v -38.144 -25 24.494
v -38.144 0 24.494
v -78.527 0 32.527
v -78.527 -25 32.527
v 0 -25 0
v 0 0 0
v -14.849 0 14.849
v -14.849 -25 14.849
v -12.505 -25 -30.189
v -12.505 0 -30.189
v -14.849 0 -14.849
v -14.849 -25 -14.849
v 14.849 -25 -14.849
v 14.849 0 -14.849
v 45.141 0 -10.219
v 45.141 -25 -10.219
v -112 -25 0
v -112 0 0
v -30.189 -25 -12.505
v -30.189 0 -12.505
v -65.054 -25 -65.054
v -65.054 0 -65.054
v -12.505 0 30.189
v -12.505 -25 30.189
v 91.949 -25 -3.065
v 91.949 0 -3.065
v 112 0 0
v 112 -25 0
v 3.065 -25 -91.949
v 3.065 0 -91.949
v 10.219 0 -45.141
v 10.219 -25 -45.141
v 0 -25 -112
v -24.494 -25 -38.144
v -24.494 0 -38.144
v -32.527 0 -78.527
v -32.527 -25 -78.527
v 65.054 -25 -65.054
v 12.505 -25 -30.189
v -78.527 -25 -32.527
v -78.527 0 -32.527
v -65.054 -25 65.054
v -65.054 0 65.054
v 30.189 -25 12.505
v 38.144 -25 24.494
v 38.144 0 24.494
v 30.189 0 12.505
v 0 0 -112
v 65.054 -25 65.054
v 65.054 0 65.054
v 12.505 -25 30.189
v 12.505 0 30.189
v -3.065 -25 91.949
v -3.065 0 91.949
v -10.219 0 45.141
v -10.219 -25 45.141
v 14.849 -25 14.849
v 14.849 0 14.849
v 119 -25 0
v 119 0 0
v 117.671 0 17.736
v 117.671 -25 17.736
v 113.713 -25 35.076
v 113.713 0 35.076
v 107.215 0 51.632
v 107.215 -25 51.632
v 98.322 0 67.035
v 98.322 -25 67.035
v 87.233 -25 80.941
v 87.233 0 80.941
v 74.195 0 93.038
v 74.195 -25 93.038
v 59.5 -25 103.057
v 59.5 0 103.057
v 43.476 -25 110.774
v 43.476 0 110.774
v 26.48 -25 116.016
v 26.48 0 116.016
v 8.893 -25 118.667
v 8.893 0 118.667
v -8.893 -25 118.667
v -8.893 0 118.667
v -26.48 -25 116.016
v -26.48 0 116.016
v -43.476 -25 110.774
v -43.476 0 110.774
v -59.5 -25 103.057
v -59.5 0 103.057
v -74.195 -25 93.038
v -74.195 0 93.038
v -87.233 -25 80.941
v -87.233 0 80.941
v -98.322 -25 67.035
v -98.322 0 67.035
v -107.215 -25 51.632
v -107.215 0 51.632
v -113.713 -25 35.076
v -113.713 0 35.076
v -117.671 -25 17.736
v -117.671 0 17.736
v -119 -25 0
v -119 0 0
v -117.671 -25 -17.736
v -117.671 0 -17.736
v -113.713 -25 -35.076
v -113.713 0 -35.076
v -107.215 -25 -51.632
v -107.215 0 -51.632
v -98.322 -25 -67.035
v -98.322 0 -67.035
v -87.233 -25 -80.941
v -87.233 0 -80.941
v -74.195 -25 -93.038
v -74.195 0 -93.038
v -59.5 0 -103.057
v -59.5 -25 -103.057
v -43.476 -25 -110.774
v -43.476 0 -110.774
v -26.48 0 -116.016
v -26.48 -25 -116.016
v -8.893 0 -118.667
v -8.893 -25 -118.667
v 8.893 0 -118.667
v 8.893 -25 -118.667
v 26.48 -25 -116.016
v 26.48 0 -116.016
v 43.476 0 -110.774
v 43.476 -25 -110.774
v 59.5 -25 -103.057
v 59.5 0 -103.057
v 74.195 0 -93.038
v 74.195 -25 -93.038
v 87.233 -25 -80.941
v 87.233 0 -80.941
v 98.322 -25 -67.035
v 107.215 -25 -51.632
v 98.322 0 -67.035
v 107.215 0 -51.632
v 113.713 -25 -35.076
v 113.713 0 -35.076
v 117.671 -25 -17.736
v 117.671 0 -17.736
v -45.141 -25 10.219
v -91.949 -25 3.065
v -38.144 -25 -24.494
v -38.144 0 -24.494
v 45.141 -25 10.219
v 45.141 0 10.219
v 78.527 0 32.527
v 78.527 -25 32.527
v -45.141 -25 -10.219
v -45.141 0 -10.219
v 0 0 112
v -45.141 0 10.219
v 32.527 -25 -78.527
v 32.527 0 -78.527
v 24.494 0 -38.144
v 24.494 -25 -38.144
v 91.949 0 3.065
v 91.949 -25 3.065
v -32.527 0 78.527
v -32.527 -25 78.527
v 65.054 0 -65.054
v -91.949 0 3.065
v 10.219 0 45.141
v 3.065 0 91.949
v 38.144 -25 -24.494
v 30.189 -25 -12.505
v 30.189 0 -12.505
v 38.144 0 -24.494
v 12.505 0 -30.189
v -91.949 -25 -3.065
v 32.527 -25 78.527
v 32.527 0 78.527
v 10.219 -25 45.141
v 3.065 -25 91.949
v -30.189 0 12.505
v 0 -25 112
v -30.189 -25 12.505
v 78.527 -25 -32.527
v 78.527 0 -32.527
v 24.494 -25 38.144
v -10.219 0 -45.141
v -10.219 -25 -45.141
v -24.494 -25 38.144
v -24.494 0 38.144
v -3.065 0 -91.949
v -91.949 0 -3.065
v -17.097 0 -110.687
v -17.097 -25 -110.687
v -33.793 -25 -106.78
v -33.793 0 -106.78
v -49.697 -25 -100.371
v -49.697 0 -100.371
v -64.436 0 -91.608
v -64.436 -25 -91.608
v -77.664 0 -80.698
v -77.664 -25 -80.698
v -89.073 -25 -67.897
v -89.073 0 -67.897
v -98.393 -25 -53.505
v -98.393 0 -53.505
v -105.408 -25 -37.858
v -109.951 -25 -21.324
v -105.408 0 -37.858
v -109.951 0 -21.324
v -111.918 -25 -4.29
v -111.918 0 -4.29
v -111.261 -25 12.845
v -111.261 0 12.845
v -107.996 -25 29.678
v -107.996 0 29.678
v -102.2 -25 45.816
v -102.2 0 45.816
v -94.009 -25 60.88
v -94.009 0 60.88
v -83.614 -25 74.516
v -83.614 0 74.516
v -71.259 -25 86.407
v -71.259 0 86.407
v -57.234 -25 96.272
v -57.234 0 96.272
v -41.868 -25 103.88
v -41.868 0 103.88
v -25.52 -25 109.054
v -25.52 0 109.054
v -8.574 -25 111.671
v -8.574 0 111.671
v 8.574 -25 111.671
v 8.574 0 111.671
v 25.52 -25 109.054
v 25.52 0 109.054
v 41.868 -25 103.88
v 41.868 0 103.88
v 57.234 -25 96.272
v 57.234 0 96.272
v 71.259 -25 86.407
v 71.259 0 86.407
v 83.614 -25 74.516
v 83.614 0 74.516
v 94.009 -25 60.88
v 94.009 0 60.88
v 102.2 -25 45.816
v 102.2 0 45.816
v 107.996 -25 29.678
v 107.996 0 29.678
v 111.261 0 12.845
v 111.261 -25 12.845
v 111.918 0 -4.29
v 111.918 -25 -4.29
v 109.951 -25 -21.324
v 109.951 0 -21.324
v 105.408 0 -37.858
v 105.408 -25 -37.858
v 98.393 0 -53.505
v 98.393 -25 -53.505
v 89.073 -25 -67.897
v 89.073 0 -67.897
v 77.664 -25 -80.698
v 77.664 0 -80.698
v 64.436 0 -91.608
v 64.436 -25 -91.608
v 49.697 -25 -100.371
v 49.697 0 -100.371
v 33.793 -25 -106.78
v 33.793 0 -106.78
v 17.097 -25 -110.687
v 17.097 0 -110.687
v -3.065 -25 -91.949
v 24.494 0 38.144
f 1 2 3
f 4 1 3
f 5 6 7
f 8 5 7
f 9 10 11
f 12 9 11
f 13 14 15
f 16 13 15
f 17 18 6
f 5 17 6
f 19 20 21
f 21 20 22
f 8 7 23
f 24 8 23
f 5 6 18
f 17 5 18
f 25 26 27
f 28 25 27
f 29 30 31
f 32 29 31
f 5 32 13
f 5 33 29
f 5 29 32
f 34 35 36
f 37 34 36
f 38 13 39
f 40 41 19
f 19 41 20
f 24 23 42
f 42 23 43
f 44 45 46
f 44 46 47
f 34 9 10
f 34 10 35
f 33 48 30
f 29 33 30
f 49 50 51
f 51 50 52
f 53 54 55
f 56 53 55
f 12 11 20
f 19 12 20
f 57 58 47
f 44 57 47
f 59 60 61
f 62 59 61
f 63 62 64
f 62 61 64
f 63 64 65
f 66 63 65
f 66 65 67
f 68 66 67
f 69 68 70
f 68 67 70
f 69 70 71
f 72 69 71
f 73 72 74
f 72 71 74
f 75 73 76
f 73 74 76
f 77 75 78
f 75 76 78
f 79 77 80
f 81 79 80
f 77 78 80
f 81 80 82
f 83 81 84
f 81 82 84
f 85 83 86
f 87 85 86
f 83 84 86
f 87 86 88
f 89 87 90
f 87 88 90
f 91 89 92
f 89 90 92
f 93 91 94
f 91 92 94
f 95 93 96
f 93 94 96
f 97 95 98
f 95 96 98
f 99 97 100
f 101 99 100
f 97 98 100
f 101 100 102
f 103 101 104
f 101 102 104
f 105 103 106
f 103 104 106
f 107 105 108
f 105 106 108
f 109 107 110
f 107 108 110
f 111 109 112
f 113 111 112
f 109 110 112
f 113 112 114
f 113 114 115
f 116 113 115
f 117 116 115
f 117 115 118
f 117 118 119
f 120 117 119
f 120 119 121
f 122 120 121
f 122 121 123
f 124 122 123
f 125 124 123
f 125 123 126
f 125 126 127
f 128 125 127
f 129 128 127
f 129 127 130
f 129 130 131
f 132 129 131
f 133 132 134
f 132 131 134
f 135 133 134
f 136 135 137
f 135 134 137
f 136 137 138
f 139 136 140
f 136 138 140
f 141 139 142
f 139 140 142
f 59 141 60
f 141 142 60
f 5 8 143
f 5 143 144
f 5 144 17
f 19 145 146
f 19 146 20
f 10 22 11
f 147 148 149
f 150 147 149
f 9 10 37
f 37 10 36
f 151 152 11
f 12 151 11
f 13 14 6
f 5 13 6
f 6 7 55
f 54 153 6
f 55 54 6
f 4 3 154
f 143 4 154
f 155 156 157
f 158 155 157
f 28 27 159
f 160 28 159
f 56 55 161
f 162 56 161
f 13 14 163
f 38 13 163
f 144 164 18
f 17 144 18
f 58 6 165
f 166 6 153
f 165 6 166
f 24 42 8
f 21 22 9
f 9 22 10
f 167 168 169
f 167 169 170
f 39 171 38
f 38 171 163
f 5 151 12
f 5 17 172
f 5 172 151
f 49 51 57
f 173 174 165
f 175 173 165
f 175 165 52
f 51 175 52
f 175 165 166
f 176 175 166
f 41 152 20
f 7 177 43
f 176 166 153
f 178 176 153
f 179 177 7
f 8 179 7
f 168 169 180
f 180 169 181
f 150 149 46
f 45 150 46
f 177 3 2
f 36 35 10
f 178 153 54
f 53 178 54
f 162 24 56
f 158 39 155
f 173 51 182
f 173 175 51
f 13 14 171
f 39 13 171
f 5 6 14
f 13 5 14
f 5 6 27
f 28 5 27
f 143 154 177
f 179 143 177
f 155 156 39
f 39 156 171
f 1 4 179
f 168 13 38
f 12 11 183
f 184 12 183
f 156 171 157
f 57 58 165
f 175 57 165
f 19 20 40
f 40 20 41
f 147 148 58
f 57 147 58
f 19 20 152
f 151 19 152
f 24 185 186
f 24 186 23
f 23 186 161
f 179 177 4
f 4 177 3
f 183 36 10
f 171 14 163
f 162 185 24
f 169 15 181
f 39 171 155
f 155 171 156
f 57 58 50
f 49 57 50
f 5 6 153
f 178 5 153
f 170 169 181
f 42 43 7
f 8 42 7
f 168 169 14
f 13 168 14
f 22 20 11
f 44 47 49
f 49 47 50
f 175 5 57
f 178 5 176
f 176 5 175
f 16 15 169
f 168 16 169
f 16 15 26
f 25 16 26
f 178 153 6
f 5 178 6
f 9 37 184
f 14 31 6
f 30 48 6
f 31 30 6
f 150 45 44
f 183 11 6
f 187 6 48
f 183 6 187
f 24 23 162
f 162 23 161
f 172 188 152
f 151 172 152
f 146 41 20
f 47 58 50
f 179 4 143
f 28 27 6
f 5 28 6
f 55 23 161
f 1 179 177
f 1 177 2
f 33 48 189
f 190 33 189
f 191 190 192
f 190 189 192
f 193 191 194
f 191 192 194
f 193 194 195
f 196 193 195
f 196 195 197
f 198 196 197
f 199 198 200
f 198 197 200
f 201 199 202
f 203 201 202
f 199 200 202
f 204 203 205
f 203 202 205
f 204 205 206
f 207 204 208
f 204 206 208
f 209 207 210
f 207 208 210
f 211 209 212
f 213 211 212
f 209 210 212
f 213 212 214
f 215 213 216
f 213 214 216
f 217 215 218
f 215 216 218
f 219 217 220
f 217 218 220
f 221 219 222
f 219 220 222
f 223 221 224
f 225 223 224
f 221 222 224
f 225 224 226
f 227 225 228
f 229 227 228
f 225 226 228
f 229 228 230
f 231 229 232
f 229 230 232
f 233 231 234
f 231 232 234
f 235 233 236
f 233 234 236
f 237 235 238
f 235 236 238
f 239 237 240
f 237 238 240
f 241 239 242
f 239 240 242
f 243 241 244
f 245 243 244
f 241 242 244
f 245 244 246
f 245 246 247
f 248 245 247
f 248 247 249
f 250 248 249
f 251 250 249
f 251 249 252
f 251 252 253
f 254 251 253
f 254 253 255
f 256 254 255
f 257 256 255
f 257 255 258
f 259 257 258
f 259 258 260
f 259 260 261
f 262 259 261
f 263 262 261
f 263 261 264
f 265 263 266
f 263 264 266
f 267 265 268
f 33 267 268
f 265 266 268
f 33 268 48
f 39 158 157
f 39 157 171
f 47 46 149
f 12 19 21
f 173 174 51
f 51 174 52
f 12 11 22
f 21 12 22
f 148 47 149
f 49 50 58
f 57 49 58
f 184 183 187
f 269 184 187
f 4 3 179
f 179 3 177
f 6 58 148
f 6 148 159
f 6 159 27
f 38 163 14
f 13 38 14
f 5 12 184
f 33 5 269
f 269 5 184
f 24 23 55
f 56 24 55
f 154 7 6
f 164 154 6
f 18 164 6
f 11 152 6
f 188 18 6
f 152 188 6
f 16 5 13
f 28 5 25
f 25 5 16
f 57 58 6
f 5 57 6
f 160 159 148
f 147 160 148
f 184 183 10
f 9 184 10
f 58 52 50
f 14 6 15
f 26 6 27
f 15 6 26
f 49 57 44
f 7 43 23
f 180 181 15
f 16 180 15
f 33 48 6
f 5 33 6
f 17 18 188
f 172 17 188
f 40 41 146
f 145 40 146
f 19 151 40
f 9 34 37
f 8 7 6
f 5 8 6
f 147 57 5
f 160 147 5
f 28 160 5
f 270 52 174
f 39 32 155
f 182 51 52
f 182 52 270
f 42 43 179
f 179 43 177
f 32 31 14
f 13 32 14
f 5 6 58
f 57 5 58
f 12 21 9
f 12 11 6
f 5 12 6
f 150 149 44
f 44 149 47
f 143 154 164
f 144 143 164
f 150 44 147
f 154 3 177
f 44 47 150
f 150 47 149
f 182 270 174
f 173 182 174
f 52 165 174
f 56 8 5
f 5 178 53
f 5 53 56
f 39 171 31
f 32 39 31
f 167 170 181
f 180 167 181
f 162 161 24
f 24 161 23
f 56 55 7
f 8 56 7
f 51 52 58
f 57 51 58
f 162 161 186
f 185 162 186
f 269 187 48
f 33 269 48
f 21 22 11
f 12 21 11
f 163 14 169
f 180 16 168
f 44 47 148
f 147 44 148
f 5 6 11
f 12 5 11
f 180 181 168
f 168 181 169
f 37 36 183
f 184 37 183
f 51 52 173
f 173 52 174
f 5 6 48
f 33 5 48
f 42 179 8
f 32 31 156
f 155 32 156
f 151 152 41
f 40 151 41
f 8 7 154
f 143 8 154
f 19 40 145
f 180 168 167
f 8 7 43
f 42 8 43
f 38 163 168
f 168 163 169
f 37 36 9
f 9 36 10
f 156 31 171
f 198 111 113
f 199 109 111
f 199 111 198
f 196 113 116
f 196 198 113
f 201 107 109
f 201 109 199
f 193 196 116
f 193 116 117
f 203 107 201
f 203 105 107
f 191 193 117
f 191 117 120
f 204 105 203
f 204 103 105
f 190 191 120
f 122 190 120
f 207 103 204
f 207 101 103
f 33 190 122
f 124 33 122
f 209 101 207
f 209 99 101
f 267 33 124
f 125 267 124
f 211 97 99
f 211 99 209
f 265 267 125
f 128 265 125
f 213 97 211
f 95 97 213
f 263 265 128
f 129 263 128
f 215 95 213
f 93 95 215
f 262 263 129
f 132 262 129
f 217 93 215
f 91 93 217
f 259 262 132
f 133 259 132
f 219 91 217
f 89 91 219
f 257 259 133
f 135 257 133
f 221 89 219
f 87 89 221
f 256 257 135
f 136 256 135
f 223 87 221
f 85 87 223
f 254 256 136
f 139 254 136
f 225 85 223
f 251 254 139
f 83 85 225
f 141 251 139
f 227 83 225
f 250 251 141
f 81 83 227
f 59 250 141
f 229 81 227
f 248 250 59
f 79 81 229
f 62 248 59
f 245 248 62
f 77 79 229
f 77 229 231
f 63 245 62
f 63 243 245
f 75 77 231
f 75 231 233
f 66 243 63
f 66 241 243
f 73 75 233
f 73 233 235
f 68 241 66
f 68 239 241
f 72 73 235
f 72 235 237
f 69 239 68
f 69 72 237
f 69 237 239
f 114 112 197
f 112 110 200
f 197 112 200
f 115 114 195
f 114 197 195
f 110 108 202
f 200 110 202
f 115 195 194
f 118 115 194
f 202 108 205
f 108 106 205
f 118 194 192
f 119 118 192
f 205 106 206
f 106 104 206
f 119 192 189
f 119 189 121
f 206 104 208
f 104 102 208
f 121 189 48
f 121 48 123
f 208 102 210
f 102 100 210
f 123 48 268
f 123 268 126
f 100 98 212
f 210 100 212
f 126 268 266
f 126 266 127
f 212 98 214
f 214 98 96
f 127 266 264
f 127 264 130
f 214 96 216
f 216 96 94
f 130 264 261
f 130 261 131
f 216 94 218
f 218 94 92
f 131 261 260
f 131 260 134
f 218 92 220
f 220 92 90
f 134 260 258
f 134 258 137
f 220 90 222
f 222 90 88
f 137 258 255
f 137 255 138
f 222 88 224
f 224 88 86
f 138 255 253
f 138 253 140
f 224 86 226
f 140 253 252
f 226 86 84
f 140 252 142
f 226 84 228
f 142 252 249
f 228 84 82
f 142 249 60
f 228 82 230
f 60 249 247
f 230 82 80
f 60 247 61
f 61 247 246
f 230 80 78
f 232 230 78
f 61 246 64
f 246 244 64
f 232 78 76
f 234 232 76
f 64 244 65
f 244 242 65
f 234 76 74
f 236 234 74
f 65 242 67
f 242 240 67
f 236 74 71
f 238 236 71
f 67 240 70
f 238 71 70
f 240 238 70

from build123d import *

# Parameters (mm, degrees)
F1_DEPTH = 25
F0_R     = 119
F2_DEPTH = 25


with BuildPart() as f1:
    # F0 (on Front) → F1 (new body)
    with BuildSketch(Plane.XZ):
        Polygon((0, -112), (0, 0), (-14.8492424049, -14.8492424049), (-12.5046251831, -30.1888357094), (-10.2192130658, -45.1410812557), (-3.0647529698, -91.9489384889), align=None)
    extrude(amount=F1_DEPTH)


with BuildPart() as f1b:
    # F0 (on Front) → F1, piece 2 (new body)
    with BuildSketch(Plane.XZ):
        Polygon((-112, 0), (0, 0), (-14.8492424049, 14.8492424049), (-30.1888357094, 12.5046251831), (-45.1410812557, 10.2192130658), (-91.9489384889, 3.0647529698), align=None)
    extrude(amount=F1_DEPTH)


with BuildPart() as f1c:
    # F0 (on Front) → F1, piece 3 (new body)
    with BuildSketch(Plane.XZ):
        Polygon((0, 112), (0, 0), (14.8492424049, 14.8492424049), (12.5046251831, 30.1888357094), (10.2192130658, 45.1410812557), (3.0647529698, 91.9489384889), align=None)
    extrude(amount=F1_DEPTH)


with BuildPart() as f1d:
    # F0 (on Front) → F1, piece 4 (new body)
    with BuildSketch(Plane.XZ):
        Polygon((112, 0), (0, 0), (14.8492424049, -14.8492424049), (30.1888357094, -12.5046251831), (45.1410812557, -10.2192130658), (91.9489384889, -3.0647529698), align=None)
    extrude(amount=F1_DEPTH)


with BuildPart() as f1e:
    # F0 (on Front) → F1, piece 5 (new body)
    with BuildSketch(Plane.XZ):
        Polygon((65.0538238692, -65.0538238692), (14.8492424049, -14.8492424049), (12.5046251831, -30.1888357094), (24.4941670021, -38.1435761053), align=None)
    extrude(amount=F1_DEPTH)


with BuildPart() as f1f:
    # F0 (on Front) → F1, piece 6 (new body)
    with BuildSketch(Plane.XZ):
        Polygon((-65.0538238692, -65.0538238692), (-14.8492424049, -14.8492424049), (-30.1888357094, -12.5046251831), (-38.1435761053, -24.4941670021), align=None)
    extrude(amount=F1_DEPTH)


with BuildPart() as f1g:
    # F0 (on Front) → F1, piece 7 (new body)
    with BuildSketch(Plane.XZ):
        Polygon((-65.0538238692, 65.0538238692), (-14.8492424049, 14.8492424049), (-12.5046251831, 30.1888357094), (-24.4941670021, 38.1435761053), align=None)
    extrude(amount=F1_DEPTH)


with BuildPart() as f1h:
    # F0 (on Front) → F1, piece 8 (new body)
    with BuildSketch(Plane.XZ):
        Polygon((65.0538238692, 65.0538238692), (14.8492424049, 14.8492424049), (30.1888357094, 12.5046251831), (38.1435761053, 24.4941670021), align=None)
    extrude(amount=F1_DEPTH)


with BuildPart() as f1i:
    # F0 (on Front) → F1, piece 9 (new body)
    with BuildSketch(Plane.XZ):
        Polygon((32.5269119346, -78.5269119346), (12.5046251831, -30.1888357094), (10.2192130658, -45.1410812557), align=None)
    extrude(amount=F1_DEPTH)


with BuildPart() as f1j:
    # F0 (on Front) → F1, piece 10 (new body)
    with BuildSketch(Plane.XZ):
        Polygon((-32.5269119346, -78.5269119346), (-12.5046251831, -30.1888357094), (-24.4941670021, -38.1435761053), align=None)
    extrude(amount=F1_DEPTH)


with BuildPart() as f1k:
    # F0 (on Front) → F1, piece 11 (new body)
    with BuildSketch(Plane.XZ):
        Polygon((-78.5269119346, -32.5269119346), (-30.1888357094, -12.5046251831), (-45.1410812557, -10.2192130658), align=None)
    extrude(amount=F1_DEPTH)


with BuildPart() as f1l:
    # F0 (on Front) → F1, piece 12 (new body)
    with BuildSketch(Plane.XZ):
        Polygon((-78.5269119346, 32.5269119346), (-30.1888357094, 12.5046251831), (-38.1435761053, 24.4941670021), align=None)
    extrude(amount=F1_DEPTH)


with BuildPart() as f1m:
    # F0 (on Front) → F1, piece 13 (new body)
    with BuildSketch(Plane.XZ):
        Polygon((-32.5269119346, 78.5269119346), (-12.5046251831, 30.1888357094), (-10.2192130658, 45.1410812557), align=None)
    extrude(amount=F1_DEPTH)


with BuildPart() as f1n:
    # F0 (on Front) → F1, piece 14 (new body)
    with BuildSketch(Plane.XZ):
        Polygon((32.5269119346, 78.5269119346), (12.5046251831, 30.1888357094), (24.4941670021, 38.1435761053), align=None)
    extrude(amount=F1_DEPTH)


with BuildPart() as f1o:
    # F0 (on Front) → F1, piece 15 (new body)
    with BuildSketch(Plane.XZ):
        Polygon((78.5269119346, 32.5269119346), (30.1888357094, 12.5046251831), (45.1410812557, 10.2192130658), align=None)
    extrude(amount=F1_DEPTH)


with BuildPart() as f1p:
    # F0 (on Front) → F1, piece 16 (new body)
    with BuildSketch(Plane.XZ):
        Polygon((78.5269119346, -32.5269119346), (30.1888357094, -12.5046251831), (38.1435761053, -24.4941670021), align=None)
    extrude(amount=F1_DEPTH)


with BuildPart() as f1q:
    # F0 (on Front) → F1, piece 17 (new body)
    with BuildSketch(Plane.XZ):
        Circle(F0_R)
        with BuildLine():
            ThreePointArc((-112, 0), (-79.1959594929, 79.1959594929), (0, 112))
            ThreePointArc((0, 112), (79.1959594929, 79.1959594929), (112, 0))
            ThreePointArc((112, 0), (79.1959594929, -79.1959594929), (0, -112))
            ThreePointArc((0, -112), (-79.1959594929, -79.1959594929), (-112, 0))
        make_face(mode=Mode.SUBTRACT)
    extrude(amount=F1_DEPTH)


with BuildPart() as f2:
    # F0 (on Front) → F2 (new body)
    with BuildSketch(Plane.XZ):
        Polygon((-30.1888357094, 12.5046251831), (-14.8492424049, 14.8492424049), (-65.0538238692, 65.0538238692), (-38.1435761053, 24.4941670021), align=None)
    extrude(amount=F2_DEPTH)


with BuildPart() as f2b:
    # F0 (on Front) → F2, piece 2 (new body)
    with BuildSketch(Plane.XZ):
        Polygon((-24.4941670021, 38.1435761053), (-12.5046251831, 30.1888357094), (-32.5269119346, 78.5269119346), align=None)
    extrude(amount=F2_DEPTH)


with BuildPart() as f2c:
    # F0 (on Front) → F2, piece 3 (new body)
    with BuildSketch(Plane.XZ):
        Polygon((-14.8492424049, 14.8492424049), (0, 0), (0, 112), (-3.0647529698, 91.9489384889), (-10.2192130658, 45.1410812557), (-12.5046251831, 30.1888357094), align=None)
    extrude(amount=F2_DEPTH)


with BuildPart() as f2d:
    # F0 (on Front) → F2, piece 4 (new body)
    with BuildSketch(Plane.XZ):
        Polygon((10.2192130658, 45.1410812557), (12.5046251831, 30.1888357094), (32.5269119346, 78.5269119346), align=None)
    extrude(amount=F2_DEPTH)


with BuildPart() as f2e:
    # F0 (on Front) → F2, piece 5 (new body)
    with BuildSketch(Plane.XZ):
        Polygon((12.5046251831, 30.1888357094), (14.8492424049, 14.8492424049), (65.0538238692, 65.0538238692), (24.4941670021, 38.1435761053), align=None)
    extrude(amount=F2_DEPTH)


with BuildPart() as f2f:
    # F0 (on Front) → F2, piece 6 (new body)
    with BuildSketch(Plane.XZ):
        Polygon((14.8492424049, 14.8492424049), (0, 0), (112, 0), (91.9489384889, 3.0647529698), (45.1410812557, 10.2192130658), (30.1888357094, 12.5046251831), align=None)
    extrude(amount=F2_DEPTH)


with BuildPart() as f2g:
    # F0 (on Front) → F2, piece 7 (new body)
    with BuildSketch(Plane.XZ):
        Polygon((38.1435761053, 24.4941670021), (30.1888357094, 12.5046251831), (78.5269119346, 32.5269119346), align=None)
    extrude(amount=F2_DEPTH)


with BuildPart() as f2h:
    # F0 (on Front) → F2, piece 8 (new body)
    with BuildSketch(Plane.XZ):
        Polygon((45.1410812557, -10.2192130658), (30.1888357094, -12.5046251831), (78.5269119346, -32.5269119346), align=None)
    extrude(amount=F2_DEPTH)


with BuildPart() as f2i:
    # F0 (on Front) → F2, piece 9 (new body)
    with BuildSketch(Plane.XZ):
        Polygon((30.1888357094, -12.5046251831), (14.8492424049, -14.8492424049), (65.0538238692, -65.0538238692), (38.1435761053, -24.4941670021), align=None)
    extrude(amount=F2_DEPTH)


with BuildPart() as f2j:
    # F0 (on Front) → F2, piece 10 (new body)
    with BuildSketch(Plane.XZ):
        Polygon((24.4941670021, -38.1435761053), (12.5046251831, -30.1888357094), (32.5269119346, -78.5269119346), align=None)
    extrude(amount=F2_DEPTH)


with BuildPart() as f2k:
    # F0 (on Front) → F2, piece 11 (new body)
    with BuildSketch(Plane.XZ):
        Polygon((14.8492424049, -14.8492424049), (0, 0), (0, -112), (3.0647529698, -91.9489384889), (10.2192130658, -45.1410812557), (12.5046251831, -30.1888357094), align=None)
    extrude(amount=F2_DEPTH)


with BuildPart() as f2l:
    # F0 (on Front) → F2, piece 12 (new body)
    with BuildSketch(Plane.XZ):
        Polygon((-10.2192130658, -45.1410812557), (-12.5046251831, -30.1888357094), (-32.5269119346, -78.5269119346), align=None)
    extrude(amount=F2_DEPTH)


with BuildPart() as f2m:
    # F0 (on Front) → F2, piece 13 (new body)
    with BuildSketch(Plane.XZ):
        Polygon((-12.5046251831, -30.1888357094), (-14.8492424049, -14.8492424049), (-65.0538238692, -65.0538238692), (-24.4941670021, -38.1435761053), align=None)
    extrude(amount=F2_DEPTH)


with BuildPart() as f2n:
    # F0 (on Front) → F2, piece 14 (new body)
    with BuildSketch(Plane.XZ):
        Polygon((-38.1435761053, -24.4941670021), (-30.1888357094, -12.5046251831), (-78.5269119346, -32.5269119346), align=None)
    extrude(amount=F2_DEPTH)


with BuildPart() as f2o:
    # F0 (on Front) → F2, piece 15 (new body)
    with BuildSketch(Plane.XZ):
        Polygon((-14.8492424049, -14.8492424049), (0, 0), (-112, 0), (-91.9489384889, -3.0647529698), (-45.1410812557, -10.2192130658), (-30.1888357094, -12.5046251831), align=None)
    extrude(amount=F2_DEPTH)


with BuildPart() as f2p:
    # F0 (on Front) → F2, piece 16 (new body)
    with BuildSketch(Plane.XZ):
        Polygon((-45.1410812557, 10.2192130658), (-30.1888357094, 12.5046251831), (-78.5269119346, 32.5269119346), align=None)
    extrude(amount=F2_DEPTH)


solid = Compound([f1.part, f1b.part, f1c.part, f1d.part, f1e.part, f1f.part, f1g.part, f1h.part, f1i.part, f1j.part, f1k.part, f1l.part, f1m.part, f1n.part, f1o.part, f1p.part, f1q.part, f2.part, f2b.part, f2c.part, f2d.part, f2e.part, f2f.part, f2g.part, f2h.part, f2i.part, f2j.part, f2k.part, f2l.part, f2m.part, f2n.part, f2o.part, f2p.part])
